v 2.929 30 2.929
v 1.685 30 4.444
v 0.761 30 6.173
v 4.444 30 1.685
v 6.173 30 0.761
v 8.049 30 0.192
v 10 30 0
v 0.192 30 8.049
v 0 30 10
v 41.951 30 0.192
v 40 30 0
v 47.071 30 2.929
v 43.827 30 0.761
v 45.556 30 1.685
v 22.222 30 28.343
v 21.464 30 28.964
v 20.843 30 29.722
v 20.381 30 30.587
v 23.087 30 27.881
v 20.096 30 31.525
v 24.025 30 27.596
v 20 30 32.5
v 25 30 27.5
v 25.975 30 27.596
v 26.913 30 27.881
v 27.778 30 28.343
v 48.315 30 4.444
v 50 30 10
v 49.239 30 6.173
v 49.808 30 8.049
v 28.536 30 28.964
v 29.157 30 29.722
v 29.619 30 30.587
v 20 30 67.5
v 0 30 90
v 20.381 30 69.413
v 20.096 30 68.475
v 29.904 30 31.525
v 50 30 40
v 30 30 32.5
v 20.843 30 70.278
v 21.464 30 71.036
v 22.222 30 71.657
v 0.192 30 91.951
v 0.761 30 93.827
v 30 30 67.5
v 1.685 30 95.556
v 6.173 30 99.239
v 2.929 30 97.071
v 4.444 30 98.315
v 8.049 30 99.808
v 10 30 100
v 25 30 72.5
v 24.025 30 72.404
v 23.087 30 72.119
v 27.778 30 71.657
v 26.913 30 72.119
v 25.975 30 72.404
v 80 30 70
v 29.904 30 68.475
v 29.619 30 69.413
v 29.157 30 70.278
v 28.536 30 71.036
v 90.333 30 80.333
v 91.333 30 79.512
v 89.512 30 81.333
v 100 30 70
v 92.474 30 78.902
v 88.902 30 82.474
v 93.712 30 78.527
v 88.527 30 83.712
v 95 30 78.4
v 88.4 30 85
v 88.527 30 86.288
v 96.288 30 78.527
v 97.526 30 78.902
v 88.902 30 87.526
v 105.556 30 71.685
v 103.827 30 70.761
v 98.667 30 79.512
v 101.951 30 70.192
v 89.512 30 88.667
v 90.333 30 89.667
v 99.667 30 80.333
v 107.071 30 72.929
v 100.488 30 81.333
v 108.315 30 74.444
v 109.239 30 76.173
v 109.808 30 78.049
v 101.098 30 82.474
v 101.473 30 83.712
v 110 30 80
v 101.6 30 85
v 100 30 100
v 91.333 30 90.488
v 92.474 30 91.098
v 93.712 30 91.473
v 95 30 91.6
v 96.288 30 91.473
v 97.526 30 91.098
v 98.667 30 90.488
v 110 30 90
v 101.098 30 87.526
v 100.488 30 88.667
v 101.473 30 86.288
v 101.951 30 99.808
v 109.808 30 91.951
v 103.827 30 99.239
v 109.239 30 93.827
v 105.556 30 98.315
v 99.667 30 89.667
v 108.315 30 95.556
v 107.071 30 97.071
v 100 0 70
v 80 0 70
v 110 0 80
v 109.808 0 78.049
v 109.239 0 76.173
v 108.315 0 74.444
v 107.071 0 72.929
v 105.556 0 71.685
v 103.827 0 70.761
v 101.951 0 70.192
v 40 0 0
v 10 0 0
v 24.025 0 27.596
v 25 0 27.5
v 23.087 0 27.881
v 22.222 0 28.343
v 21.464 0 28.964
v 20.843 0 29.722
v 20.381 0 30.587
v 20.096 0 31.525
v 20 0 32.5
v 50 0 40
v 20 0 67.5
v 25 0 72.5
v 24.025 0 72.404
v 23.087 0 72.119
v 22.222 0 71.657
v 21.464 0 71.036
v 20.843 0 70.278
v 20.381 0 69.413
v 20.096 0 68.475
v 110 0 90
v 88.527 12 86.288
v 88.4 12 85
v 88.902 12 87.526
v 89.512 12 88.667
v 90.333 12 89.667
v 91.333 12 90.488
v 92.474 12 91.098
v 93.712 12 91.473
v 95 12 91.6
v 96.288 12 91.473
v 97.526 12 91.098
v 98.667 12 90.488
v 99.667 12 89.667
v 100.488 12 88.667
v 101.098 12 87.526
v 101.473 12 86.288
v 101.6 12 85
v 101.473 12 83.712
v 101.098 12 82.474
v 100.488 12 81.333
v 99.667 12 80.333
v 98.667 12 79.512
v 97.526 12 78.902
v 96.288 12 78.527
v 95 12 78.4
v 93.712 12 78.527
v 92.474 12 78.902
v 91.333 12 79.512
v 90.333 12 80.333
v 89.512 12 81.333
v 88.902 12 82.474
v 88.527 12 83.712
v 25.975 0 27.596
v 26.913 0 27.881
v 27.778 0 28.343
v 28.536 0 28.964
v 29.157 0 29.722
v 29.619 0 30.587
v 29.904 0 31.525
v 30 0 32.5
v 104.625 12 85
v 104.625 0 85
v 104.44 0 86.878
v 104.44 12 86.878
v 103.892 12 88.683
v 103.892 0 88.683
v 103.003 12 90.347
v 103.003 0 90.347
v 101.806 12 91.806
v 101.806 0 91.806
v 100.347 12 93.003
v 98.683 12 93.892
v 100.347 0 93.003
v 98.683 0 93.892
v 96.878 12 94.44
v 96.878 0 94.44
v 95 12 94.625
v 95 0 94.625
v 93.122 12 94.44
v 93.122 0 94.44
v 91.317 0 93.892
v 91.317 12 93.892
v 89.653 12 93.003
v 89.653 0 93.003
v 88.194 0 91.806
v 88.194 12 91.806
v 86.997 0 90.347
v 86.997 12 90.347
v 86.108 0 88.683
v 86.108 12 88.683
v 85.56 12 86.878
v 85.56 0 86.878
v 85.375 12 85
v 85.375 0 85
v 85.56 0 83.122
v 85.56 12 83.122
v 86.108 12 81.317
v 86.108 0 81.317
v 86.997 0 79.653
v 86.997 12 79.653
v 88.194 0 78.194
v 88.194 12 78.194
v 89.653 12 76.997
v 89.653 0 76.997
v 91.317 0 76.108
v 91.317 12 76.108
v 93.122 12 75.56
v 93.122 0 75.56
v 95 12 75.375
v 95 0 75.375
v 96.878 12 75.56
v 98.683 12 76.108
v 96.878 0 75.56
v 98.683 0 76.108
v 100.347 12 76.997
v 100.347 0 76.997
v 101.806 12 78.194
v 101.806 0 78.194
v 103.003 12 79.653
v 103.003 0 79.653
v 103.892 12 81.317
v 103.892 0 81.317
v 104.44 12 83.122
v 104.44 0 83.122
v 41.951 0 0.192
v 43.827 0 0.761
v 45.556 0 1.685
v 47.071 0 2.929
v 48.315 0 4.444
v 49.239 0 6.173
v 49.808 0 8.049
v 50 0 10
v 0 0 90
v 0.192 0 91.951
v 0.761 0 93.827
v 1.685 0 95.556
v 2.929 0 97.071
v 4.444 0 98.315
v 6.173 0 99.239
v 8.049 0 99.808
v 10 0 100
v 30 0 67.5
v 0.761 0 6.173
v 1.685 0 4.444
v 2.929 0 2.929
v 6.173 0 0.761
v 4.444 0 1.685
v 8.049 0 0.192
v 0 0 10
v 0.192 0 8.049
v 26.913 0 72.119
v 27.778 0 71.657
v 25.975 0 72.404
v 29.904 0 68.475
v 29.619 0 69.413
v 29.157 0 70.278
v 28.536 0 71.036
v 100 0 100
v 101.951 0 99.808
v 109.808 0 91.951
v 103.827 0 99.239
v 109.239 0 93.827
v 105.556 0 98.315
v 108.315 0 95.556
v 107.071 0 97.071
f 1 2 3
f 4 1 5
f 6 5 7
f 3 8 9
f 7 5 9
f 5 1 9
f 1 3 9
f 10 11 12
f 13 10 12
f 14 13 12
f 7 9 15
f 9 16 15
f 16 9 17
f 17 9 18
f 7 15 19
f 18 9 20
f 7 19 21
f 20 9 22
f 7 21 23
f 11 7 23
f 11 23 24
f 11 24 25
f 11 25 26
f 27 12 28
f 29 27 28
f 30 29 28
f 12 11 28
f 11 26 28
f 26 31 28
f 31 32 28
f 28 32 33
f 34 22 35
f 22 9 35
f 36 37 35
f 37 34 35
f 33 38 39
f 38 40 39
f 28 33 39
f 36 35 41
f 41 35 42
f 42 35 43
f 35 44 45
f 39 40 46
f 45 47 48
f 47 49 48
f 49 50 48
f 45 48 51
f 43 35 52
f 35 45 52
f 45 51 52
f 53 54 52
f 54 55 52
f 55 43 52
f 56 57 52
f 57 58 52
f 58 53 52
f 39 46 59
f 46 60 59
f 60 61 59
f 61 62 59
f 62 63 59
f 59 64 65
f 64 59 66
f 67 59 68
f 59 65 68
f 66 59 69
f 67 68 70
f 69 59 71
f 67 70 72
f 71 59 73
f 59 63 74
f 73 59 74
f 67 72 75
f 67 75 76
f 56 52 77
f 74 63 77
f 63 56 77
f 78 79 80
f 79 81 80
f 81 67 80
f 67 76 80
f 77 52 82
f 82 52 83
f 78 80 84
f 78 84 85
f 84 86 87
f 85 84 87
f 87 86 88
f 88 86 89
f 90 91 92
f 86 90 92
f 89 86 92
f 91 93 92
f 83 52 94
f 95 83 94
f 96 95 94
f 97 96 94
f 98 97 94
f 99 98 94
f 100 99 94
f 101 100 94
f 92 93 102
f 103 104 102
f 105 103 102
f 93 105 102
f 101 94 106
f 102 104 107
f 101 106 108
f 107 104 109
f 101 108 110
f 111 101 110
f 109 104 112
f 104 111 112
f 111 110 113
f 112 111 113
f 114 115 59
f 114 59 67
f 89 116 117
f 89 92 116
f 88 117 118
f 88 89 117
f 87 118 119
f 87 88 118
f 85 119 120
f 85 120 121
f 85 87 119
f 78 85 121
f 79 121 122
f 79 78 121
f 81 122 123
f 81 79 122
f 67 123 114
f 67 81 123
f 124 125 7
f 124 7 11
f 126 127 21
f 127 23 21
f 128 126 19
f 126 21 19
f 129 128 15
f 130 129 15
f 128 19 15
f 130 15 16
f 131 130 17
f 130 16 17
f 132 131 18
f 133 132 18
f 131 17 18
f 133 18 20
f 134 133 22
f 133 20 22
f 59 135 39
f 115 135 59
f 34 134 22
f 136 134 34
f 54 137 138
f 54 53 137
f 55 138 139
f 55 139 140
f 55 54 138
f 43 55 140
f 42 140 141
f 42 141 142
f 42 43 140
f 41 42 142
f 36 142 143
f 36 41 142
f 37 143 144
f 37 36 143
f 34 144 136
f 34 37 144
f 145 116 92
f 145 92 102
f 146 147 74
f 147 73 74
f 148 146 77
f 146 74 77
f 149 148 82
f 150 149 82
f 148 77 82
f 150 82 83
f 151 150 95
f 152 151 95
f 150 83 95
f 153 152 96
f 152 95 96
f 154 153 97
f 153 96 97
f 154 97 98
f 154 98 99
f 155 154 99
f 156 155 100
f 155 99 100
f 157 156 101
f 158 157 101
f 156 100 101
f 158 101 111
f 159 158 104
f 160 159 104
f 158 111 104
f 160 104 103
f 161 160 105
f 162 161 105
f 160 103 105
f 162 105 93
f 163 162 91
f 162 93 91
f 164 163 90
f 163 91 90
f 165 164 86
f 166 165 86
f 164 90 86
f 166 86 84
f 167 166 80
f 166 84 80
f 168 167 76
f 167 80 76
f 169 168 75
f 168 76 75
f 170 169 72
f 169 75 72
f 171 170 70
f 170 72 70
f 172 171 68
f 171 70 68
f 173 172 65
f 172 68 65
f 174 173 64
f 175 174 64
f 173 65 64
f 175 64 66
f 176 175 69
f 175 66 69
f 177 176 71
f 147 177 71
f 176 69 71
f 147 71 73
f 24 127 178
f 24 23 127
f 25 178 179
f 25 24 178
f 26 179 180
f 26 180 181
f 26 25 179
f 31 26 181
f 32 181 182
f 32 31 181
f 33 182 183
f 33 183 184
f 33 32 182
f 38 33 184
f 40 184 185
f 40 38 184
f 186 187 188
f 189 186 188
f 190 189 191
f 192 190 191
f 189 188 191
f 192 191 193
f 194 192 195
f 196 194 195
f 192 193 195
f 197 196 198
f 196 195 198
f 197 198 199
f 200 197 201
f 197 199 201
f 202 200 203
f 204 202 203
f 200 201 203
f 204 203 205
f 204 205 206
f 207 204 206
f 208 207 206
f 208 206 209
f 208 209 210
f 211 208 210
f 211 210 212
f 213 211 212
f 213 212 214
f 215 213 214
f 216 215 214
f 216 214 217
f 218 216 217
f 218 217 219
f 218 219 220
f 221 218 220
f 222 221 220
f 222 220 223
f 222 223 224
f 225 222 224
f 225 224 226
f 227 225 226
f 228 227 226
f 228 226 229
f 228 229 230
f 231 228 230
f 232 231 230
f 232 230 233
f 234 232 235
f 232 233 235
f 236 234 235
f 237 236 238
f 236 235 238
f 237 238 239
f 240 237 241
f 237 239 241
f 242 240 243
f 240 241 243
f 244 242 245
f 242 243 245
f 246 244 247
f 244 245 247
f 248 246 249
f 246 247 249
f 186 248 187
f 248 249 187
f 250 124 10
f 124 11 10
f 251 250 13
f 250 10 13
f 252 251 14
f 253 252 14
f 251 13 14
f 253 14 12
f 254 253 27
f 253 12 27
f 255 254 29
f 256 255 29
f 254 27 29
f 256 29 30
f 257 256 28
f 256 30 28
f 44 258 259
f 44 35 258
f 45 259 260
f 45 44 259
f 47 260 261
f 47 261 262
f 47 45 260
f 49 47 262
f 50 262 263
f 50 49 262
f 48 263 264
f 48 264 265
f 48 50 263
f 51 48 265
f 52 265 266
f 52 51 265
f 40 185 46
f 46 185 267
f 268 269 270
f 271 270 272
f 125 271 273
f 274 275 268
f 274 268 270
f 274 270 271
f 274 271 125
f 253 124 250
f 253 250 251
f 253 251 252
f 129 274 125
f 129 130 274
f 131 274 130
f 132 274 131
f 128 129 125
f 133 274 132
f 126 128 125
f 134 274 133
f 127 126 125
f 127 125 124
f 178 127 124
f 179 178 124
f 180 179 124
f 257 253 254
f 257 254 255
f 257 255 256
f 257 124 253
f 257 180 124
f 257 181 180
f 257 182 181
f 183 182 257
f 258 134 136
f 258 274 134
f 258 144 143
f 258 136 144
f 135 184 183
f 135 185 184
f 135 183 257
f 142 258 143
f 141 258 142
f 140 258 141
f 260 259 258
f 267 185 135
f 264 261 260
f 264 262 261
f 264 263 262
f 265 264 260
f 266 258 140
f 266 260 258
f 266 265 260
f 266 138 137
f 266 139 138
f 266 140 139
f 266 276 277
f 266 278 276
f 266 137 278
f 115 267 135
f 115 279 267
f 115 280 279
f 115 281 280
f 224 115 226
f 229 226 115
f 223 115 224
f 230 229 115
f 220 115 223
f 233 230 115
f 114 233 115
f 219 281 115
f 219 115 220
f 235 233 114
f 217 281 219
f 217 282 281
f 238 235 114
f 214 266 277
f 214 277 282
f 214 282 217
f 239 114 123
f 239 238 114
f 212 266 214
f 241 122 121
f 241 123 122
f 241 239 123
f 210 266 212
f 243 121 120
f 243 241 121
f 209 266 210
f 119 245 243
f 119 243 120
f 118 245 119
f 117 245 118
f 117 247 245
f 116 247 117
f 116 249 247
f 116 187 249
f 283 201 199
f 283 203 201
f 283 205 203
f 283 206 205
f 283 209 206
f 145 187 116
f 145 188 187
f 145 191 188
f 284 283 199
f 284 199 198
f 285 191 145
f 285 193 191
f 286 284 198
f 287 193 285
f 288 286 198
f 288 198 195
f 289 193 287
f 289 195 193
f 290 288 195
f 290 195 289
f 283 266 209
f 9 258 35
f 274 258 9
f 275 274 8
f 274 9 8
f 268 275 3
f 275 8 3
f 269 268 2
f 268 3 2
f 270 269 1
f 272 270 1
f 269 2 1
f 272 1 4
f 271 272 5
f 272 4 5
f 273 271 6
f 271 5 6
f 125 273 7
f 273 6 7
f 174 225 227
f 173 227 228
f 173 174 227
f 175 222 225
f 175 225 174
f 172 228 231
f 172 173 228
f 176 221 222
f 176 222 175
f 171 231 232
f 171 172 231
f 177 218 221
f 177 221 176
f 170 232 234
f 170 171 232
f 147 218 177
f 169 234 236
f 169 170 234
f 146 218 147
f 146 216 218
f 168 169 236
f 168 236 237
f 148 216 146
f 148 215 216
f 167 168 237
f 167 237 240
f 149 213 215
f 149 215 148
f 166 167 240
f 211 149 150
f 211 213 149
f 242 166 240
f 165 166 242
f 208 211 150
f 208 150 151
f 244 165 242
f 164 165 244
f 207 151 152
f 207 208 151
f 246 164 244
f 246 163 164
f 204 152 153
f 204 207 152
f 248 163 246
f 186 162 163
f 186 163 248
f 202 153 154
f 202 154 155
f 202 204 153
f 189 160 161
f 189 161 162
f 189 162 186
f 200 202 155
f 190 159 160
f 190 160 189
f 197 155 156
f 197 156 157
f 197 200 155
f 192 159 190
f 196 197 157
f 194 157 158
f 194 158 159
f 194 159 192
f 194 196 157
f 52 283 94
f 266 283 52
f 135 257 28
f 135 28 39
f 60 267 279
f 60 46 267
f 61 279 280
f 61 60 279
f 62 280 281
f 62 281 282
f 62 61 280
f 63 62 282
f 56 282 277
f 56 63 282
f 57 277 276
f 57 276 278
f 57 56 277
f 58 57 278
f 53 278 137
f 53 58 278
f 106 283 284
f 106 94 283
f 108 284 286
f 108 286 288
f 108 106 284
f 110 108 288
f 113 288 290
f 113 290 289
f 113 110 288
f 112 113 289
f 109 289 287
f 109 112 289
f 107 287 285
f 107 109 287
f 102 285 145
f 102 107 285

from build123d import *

# Parameters (mm, degrees)
F1_DEPTH       = 30
F3_D           = 13.2
F3_CBORE_D     = 19.25
F3_CBORE_DEPTH = 12
F4_R           = 10
F5_W           = 10
F5_H           = 45
F6_DEPTH       = 30.001
F7_R           = 4.99999


# Not quite as in the source:
# - a fillet or chamfer is up to 0.001 mm smaller than in the source, because OpenCascade refuses the exact size


with BuildPart() as f1:
    # F0 (on Front) → F1 (new body)
    with BuildSketch(Plane.XZ):
        Polygon((0, 100), (0, 0), (50, 0), (50, 40), (80, 70), (110, 70), (110, 100), align=None)
    extrude(amount=-F1_DEPTH)

    # F3 (through all)
    with Locations(Plane.XZ):
        with Locations((95, 85)):
            CounterBoreHole(F3_D / 2, F3_CBORE_D / 2, F3_CBORE_DEPTH)

    # F4
    f4_edges = [f1.edges().sort_by_distance(p)[0] for p in [
        (0, 15, 100),
        (50, 15, 0),
        (110, 15, 70),
        (110, 15, 100),
        (0, 15, 0),
    ]]
    fillet(f4_edges, radius=F4_R)

    # F5 (on face) → F6 (cut, through all)
    with BuildSketch(Plane.XZ):
        with Locations((25, 50)):
            Rectangle(F5_W, F5_H)
    extrude(amount=-F6_DEPTH, mode=Mode.SUBTRACT)

    # F7 (radius 5 in the source; OpenCascade refuses exactly that, so slightly less here)
    f7_edges = [f1.edges().sort_by_distance(p)[0] for p in [
        (20, 15, 72.5),
        (30, 15, 72.5),
        (30, 15, 27.5),
        (20, 15, 27.5),
    ]]
    fillet(f7_edges, radius=F7_R)


solid = f1.part
